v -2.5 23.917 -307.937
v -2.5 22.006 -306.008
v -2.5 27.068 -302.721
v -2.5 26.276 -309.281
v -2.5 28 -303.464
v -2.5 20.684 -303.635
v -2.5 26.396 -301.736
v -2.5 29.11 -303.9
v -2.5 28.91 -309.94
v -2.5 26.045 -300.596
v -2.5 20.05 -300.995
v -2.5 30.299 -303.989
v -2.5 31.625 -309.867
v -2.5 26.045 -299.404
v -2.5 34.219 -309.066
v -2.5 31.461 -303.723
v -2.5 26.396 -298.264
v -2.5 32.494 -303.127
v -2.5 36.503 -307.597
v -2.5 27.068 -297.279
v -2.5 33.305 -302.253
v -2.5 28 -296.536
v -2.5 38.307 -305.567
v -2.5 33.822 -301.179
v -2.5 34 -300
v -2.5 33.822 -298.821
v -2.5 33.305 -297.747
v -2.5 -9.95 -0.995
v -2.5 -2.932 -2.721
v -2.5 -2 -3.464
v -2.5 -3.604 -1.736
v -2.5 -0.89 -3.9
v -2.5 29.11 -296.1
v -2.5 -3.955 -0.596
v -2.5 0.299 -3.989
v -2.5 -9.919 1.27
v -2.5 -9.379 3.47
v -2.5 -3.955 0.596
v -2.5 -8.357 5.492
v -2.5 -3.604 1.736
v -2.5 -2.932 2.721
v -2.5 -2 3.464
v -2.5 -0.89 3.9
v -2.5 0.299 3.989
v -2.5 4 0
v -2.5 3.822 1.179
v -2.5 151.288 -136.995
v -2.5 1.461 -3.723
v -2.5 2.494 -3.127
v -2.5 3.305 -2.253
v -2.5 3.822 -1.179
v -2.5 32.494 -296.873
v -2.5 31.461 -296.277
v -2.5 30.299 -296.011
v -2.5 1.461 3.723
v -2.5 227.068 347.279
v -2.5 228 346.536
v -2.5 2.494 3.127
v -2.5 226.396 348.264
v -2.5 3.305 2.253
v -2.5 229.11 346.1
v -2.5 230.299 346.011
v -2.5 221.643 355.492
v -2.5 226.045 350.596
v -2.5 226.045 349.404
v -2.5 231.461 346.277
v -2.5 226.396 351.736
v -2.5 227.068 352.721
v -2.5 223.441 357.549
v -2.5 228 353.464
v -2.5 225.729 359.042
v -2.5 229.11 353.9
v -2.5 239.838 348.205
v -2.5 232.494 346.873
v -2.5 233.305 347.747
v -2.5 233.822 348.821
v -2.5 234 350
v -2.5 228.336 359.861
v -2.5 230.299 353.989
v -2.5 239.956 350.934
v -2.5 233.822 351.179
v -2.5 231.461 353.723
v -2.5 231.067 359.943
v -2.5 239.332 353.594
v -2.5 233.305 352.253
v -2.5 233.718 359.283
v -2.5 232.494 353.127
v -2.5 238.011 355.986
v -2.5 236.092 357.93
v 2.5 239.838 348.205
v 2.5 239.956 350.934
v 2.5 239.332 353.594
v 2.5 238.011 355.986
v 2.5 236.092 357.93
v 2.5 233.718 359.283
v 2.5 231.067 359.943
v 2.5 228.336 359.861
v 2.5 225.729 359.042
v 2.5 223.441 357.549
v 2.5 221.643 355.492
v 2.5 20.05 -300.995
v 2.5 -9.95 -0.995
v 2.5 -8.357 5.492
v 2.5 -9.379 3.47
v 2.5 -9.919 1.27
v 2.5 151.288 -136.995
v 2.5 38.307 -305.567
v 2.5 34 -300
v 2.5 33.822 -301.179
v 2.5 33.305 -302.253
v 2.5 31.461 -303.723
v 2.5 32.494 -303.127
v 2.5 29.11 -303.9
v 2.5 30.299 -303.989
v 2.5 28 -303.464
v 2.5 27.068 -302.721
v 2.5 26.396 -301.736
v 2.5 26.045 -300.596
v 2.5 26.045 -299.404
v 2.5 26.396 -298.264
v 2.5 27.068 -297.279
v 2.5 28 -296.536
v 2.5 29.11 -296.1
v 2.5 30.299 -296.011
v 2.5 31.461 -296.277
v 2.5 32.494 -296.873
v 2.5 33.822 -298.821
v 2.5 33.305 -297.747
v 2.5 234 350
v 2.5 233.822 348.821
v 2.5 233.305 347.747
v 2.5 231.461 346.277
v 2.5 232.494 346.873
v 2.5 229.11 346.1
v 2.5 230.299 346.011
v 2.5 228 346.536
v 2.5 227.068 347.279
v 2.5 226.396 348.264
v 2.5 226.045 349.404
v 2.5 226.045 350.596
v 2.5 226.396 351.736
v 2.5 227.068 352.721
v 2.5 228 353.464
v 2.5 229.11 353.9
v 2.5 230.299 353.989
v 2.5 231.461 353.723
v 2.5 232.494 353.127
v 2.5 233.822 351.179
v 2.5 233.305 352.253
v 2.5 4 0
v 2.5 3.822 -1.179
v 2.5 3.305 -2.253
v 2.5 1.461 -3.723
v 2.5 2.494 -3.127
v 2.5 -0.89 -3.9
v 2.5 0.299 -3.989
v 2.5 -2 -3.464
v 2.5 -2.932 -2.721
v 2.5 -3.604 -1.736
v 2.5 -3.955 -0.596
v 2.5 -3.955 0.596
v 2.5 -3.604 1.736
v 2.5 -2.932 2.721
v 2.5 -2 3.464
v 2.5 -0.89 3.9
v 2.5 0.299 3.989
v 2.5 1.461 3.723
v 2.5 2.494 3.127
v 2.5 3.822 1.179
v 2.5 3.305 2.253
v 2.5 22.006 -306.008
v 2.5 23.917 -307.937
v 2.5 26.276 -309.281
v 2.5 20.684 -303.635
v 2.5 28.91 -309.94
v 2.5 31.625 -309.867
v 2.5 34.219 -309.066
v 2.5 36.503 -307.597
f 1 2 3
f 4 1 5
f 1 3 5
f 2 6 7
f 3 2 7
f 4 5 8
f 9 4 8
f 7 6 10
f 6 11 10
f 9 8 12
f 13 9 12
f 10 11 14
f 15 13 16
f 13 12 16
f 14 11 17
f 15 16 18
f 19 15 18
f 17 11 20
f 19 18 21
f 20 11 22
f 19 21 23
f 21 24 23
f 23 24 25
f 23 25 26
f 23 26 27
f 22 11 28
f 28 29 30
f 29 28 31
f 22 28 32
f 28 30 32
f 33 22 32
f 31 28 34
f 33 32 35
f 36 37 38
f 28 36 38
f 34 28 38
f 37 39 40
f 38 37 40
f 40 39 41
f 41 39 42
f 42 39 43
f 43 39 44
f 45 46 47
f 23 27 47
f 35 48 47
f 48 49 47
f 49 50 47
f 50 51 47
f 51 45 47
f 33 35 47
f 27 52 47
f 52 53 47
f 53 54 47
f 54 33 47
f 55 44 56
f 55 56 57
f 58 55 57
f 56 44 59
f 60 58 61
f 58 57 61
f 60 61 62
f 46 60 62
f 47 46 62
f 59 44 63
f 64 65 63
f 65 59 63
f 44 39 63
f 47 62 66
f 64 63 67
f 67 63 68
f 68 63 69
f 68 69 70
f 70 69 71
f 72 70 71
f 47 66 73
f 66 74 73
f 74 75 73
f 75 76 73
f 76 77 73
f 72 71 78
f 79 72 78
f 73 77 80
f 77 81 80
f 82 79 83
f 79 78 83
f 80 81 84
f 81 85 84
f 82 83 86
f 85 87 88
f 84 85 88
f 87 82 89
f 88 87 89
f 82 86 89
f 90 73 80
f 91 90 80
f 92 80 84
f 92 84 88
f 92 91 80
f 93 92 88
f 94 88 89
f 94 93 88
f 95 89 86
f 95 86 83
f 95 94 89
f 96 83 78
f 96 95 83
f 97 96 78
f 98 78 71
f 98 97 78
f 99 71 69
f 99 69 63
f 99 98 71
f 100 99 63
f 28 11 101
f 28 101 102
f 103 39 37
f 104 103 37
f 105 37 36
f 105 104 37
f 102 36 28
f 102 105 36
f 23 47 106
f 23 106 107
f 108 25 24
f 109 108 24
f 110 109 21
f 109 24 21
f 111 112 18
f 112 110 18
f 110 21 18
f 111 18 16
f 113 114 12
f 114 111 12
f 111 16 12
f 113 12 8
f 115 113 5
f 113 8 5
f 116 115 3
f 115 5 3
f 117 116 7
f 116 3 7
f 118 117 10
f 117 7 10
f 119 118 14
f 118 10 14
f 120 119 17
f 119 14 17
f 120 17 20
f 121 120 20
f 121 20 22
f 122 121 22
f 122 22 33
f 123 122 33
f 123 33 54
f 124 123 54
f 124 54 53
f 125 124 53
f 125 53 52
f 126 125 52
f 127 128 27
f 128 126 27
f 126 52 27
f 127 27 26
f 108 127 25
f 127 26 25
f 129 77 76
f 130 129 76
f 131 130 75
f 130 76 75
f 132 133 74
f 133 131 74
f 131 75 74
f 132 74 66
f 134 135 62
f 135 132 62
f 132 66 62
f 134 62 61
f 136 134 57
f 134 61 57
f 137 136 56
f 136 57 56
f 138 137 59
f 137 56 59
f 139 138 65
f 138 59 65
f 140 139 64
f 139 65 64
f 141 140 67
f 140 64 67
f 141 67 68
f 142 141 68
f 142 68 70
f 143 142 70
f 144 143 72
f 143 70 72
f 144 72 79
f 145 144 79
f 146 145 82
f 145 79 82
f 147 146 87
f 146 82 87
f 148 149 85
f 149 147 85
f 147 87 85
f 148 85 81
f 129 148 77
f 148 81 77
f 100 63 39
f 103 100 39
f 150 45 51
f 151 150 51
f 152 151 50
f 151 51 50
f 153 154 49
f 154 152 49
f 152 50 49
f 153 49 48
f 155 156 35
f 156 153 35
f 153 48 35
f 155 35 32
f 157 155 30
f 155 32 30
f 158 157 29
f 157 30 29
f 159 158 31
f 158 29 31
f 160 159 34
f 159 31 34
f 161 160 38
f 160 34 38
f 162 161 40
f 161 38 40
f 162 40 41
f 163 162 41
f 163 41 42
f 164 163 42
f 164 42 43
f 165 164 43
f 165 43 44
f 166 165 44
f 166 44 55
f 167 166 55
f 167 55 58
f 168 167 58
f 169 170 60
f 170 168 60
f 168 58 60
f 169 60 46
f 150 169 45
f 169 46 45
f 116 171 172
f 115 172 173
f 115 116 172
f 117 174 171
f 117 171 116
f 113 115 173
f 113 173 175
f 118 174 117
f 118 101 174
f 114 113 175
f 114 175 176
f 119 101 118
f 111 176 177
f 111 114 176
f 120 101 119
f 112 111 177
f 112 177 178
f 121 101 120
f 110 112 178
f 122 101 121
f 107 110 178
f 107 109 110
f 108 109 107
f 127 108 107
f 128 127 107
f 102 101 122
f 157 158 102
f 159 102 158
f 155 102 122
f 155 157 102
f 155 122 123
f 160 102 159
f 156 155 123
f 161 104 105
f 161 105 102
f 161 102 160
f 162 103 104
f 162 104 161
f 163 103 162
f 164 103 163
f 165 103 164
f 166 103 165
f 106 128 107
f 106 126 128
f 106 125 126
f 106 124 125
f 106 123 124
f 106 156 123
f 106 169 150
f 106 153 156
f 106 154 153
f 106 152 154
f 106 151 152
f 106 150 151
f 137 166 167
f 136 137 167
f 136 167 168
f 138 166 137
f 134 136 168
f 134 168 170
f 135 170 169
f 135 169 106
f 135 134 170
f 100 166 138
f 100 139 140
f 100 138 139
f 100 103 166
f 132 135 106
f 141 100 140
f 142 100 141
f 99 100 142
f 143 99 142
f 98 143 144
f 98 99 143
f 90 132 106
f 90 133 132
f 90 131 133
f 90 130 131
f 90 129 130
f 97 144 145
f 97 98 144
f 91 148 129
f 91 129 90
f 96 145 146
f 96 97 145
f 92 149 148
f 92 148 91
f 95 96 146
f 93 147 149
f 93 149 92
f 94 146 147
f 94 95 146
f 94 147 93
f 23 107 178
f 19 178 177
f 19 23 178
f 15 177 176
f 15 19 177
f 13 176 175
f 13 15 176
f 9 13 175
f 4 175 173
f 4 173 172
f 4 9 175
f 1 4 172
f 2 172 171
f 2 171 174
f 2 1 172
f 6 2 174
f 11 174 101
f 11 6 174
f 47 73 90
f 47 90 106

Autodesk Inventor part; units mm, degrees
ref_plane "YZ Plane" through (0, 0, 0) normal (1, 0, 0) x (0, 1, 0)
ref_plane "XZ Plane" through (0, 0, 0) normal (0, 1, 0) x (-1, 0, 0)
ref_plane "XY Plane" through (0, 0, 0) normal (0, 0, 1) x (1, 0, 0)
sketch "スケッチ1" plane through (0, 0, 0) normal (1, 0, 0) x (0, 1, 0)
  circle A0 centre (0, 0) radius 4
  circle A1 centre (30, -300) radius 4
  circle A2 centre (230, 350) radius 4
  line L0 (248.6746, 396.6269) -> (151.2885, -136.9946)
  line L1 (151.2885, -136.9946) -> (22.8179, -328.6776)
  line L2 (22.8179, -328.6776) -> (-10.3029, 2.5306)
  line L3 (248.6746, 396.6269) -> (-10.3029, 2.5306)
  dimension "d0" = 30
  dimension "d1" = 300
  dimension "d2" = 8
  dimension "d3" = 8
  dimension "d4" = 350
  dimension "d5" = 230
  dimension "d6" = 8
  dimension "d9" = 10
  dimension "d11" = 10
  dimension "d13" = 10
  dimension "d14" = 10
  dimension "d16" = 10
  dimension "d29" = 10
extrude "押し出し3" add sketch "スケッチ1" along normal mid plane 5
fillet "フィレット3" radius 10 3 edges at (0, 248.6746, 396.6269) (0, 22.8179, -328.6776) (0, -10.3029, 2.5306)
properties part number "swan_plate"
